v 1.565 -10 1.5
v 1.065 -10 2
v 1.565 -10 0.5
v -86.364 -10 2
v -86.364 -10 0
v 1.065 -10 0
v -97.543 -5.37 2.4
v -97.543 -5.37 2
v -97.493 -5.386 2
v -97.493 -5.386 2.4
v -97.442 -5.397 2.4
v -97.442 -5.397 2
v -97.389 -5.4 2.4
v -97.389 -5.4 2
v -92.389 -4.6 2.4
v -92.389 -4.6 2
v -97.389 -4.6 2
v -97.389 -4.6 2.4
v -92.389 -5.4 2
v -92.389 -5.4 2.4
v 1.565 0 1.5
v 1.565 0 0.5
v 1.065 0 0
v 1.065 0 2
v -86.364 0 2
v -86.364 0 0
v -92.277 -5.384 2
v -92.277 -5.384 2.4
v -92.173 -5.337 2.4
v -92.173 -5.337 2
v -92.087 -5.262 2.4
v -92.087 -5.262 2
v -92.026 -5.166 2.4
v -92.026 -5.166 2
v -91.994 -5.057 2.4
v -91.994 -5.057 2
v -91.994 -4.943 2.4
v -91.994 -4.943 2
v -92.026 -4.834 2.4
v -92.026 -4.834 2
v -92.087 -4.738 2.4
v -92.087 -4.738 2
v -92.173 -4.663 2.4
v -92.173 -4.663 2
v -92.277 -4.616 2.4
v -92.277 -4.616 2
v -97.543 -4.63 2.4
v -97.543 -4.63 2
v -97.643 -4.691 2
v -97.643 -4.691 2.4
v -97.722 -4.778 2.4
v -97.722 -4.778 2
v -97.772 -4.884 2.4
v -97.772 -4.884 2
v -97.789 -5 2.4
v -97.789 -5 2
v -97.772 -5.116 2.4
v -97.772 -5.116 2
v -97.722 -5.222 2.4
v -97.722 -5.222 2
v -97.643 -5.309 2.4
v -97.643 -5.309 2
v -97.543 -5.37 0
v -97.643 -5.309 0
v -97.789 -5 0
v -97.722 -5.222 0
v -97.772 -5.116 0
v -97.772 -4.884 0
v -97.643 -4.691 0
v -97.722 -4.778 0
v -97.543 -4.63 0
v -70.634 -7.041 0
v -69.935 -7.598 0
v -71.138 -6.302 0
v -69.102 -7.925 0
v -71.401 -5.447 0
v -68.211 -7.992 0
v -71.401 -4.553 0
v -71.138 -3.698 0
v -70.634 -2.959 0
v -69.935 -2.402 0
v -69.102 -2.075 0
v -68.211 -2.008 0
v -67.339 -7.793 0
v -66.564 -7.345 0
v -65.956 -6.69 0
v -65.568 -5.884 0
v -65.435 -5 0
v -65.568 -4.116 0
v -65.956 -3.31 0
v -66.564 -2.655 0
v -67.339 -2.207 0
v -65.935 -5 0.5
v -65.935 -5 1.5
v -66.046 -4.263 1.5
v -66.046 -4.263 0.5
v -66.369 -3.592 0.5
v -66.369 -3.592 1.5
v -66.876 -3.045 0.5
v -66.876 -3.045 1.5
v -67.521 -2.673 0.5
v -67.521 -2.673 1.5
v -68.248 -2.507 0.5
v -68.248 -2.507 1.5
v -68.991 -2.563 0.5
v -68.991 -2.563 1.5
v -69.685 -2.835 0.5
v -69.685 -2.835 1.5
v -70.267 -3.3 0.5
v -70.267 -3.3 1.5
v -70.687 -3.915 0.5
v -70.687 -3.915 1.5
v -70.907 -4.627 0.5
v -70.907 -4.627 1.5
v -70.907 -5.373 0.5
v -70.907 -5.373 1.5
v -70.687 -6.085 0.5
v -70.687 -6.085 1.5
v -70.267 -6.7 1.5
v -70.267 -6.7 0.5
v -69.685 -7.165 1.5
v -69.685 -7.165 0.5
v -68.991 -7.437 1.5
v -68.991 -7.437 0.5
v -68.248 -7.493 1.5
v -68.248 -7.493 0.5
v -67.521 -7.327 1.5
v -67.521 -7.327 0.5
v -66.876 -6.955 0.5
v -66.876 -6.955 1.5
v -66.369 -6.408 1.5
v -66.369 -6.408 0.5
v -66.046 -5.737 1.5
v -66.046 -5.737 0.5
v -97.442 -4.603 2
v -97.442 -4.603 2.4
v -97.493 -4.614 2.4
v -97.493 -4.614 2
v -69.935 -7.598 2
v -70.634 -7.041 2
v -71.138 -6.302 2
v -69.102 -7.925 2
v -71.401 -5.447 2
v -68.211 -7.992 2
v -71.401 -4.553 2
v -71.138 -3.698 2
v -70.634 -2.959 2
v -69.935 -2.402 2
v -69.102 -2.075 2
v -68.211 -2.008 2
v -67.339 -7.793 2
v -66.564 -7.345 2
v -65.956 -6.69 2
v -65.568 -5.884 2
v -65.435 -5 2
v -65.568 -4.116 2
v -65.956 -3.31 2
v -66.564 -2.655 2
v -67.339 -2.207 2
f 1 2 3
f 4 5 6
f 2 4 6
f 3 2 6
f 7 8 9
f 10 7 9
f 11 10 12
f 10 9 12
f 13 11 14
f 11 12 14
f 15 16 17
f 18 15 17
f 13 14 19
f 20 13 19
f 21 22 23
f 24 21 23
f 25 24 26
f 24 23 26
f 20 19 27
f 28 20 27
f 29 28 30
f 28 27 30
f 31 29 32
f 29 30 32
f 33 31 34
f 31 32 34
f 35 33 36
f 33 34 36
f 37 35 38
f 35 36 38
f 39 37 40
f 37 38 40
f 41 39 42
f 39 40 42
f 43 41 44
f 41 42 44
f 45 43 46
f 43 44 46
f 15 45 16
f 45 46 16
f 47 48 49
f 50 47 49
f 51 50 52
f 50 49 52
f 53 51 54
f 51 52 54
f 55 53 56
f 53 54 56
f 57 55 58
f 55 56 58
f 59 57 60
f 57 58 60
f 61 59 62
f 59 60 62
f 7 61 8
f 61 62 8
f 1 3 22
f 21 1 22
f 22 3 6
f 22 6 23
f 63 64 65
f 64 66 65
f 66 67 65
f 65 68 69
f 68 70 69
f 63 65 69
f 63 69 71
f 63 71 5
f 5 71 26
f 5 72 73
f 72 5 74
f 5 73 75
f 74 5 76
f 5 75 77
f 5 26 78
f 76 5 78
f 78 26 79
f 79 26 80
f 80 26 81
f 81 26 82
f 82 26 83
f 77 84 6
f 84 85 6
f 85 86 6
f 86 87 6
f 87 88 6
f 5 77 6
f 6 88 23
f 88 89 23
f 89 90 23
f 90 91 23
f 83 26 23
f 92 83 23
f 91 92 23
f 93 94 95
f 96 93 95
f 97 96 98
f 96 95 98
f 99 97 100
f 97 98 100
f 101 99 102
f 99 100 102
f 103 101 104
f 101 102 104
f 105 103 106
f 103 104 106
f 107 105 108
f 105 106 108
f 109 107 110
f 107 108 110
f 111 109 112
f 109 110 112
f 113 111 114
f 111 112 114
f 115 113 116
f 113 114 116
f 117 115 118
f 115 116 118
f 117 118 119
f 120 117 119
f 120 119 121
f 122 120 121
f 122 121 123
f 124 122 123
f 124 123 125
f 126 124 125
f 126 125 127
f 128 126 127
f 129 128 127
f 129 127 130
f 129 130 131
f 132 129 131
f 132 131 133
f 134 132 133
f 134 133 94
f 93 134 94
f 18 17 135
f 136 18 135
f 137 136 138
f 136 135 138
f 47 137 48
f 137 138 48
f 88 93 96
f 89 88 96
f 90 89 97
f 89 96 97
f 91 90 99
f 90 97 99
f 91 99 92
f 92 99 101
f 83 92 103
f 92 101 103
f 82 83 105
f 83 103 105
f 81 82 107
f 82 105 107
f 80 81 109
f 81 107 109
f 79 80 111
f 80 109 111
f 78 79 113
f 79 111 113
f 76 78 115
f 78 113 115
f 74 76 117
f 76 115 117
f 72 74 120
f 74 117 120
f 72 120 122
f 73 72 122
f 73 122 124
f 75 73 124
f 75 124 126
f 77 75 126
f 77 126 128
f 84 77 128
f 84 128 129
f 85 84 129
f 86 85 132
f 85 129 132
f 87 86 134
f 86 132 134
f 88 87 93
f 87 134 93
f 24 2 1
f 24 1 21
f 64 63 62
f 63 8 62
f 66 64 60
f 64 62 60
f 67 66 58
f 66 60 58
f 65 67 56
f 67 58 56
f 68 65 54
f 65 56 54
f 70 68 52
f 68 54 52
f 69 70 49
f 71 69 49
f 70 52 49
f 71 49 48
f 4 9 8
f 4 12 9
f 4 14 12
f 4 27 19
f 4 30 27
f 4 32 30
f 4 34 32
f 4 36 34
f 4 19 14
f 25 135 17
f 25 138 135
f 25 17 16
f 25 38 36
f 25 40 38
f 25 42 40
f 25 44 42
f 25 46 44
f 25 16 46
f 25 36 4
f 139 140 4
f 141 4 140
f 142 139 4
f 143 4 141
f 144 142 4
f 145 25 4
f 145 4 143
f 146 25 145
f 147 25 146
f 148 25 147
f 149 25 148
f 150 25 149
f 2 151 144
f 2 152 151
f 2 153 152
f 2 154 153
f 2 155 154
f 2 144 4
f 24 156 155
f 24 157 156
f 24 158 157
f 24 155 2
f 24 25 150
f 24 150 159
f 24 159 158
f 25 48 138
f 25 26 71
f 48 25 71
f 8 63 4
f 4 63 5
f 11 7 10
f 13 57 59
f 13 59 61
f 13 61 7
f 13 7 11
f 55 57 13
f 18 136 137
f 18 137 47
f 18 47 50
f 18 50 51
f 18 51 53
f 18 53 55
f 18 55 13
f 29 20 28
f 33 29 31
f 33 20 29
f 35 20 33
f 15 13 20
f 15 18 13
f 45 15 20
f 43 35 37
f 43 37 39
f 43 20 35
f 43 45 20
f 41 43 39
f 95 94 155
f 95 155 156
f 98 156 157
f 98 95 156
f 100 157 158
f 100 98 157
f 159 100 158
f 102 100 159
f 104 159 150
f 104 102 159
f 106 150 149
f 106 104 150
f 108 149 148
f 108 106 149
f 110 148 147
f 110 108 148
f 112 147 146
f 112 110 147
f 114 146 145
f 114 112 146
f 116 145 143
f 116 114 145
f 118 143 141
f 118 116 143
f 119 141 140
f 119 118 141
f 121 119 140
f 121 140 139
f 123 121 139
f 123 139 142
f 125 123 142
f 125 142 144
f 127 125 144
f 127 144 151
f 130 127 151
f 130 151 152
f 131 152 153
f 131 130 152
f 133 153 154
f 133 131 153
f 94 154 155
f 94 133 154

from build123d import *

# Parameters (mm, degrees)
F1_DEPTH = 2
F2_R     = 2.5
F3_DEPTH = 25
F4_SIZE  = 0.5
F5_SIZE  = 0.5
F6_R     = 0.4
F8_DEPTH = 0.4


with BuildPart() as f1:
    # F0 (on Top) → F1 (new body)
    with BuildSketch(Plane.XY):
        Polygon((1.5653009757, -10), (1.5653009757, 0), (-86.3636312124, 0), (-98.4346990243, -5), (-86.3636312124, -10), align=None)
    extrude(amount=F1_DEPTH)

    # F2 (on face) → F3 (cut)
    with BuildSketch(Plane.XY.offset(2)):
        with Locations((-68.4346990243, -5)):
            Circle(F2_R)
    extrude(amount=-F3_DEPTH, mode=Mode.SUBTRACT)

    # F4
    f4_edges = [f1.edges().sort_by_distance(p)[0] for p in [
        (-70.934699, -5, 2),
        (-70.934699, -5, 0),
    ]]
    chamfer(f4_edges, length=F4_SIZE)

    # F5
    f5_edges = [f1.edges().sort_by_distance(p)[0] for p in [
        (1.565301, -5, 2),
        (1.565301, -5, 0),
    ]]
    chamfer(f5_edges, length=F5_SIZE)

    # F6
    f6_edges = [f1.edges().sort_by_distance(p)[0] for p in [
        (-98.434699, -5, 1),
    ]]
    fillet(f6_edges, radius=F6_R)

    # F7 (on face) → F8 (join)
    with BuildSketch(Plane.XY.offset(2)):
        with BuildLine():
            ThreePointArc((-97.5425220254, -5.369551813), (-97.4674847812, -5.3923141122), (-97.3894486524, -5.4))
            Line((-97.3894486524, -5.4), (-92.3894486524, -5.4))
            ThreePointArc((-92.3894486524, -5.4), (-91.9894486524, -5), (-92.3894486524, -4.6))
            Line((-92.3894486524, -4.6), (-97.3894486524, -4.6))
            ThreePointArc((-97.3894486524, -4.6), (-97.4674847812, -4.6076858878), (-97.5425220254, -4.630448187))
            ThreePointArc((-97.5425220254, -4.630448187), (-97.7894486524, -5), (-97.5425220254, -5.369551813))
        make_face()
    extrude(amount=F8_DEPTH)


solid = f1.part
